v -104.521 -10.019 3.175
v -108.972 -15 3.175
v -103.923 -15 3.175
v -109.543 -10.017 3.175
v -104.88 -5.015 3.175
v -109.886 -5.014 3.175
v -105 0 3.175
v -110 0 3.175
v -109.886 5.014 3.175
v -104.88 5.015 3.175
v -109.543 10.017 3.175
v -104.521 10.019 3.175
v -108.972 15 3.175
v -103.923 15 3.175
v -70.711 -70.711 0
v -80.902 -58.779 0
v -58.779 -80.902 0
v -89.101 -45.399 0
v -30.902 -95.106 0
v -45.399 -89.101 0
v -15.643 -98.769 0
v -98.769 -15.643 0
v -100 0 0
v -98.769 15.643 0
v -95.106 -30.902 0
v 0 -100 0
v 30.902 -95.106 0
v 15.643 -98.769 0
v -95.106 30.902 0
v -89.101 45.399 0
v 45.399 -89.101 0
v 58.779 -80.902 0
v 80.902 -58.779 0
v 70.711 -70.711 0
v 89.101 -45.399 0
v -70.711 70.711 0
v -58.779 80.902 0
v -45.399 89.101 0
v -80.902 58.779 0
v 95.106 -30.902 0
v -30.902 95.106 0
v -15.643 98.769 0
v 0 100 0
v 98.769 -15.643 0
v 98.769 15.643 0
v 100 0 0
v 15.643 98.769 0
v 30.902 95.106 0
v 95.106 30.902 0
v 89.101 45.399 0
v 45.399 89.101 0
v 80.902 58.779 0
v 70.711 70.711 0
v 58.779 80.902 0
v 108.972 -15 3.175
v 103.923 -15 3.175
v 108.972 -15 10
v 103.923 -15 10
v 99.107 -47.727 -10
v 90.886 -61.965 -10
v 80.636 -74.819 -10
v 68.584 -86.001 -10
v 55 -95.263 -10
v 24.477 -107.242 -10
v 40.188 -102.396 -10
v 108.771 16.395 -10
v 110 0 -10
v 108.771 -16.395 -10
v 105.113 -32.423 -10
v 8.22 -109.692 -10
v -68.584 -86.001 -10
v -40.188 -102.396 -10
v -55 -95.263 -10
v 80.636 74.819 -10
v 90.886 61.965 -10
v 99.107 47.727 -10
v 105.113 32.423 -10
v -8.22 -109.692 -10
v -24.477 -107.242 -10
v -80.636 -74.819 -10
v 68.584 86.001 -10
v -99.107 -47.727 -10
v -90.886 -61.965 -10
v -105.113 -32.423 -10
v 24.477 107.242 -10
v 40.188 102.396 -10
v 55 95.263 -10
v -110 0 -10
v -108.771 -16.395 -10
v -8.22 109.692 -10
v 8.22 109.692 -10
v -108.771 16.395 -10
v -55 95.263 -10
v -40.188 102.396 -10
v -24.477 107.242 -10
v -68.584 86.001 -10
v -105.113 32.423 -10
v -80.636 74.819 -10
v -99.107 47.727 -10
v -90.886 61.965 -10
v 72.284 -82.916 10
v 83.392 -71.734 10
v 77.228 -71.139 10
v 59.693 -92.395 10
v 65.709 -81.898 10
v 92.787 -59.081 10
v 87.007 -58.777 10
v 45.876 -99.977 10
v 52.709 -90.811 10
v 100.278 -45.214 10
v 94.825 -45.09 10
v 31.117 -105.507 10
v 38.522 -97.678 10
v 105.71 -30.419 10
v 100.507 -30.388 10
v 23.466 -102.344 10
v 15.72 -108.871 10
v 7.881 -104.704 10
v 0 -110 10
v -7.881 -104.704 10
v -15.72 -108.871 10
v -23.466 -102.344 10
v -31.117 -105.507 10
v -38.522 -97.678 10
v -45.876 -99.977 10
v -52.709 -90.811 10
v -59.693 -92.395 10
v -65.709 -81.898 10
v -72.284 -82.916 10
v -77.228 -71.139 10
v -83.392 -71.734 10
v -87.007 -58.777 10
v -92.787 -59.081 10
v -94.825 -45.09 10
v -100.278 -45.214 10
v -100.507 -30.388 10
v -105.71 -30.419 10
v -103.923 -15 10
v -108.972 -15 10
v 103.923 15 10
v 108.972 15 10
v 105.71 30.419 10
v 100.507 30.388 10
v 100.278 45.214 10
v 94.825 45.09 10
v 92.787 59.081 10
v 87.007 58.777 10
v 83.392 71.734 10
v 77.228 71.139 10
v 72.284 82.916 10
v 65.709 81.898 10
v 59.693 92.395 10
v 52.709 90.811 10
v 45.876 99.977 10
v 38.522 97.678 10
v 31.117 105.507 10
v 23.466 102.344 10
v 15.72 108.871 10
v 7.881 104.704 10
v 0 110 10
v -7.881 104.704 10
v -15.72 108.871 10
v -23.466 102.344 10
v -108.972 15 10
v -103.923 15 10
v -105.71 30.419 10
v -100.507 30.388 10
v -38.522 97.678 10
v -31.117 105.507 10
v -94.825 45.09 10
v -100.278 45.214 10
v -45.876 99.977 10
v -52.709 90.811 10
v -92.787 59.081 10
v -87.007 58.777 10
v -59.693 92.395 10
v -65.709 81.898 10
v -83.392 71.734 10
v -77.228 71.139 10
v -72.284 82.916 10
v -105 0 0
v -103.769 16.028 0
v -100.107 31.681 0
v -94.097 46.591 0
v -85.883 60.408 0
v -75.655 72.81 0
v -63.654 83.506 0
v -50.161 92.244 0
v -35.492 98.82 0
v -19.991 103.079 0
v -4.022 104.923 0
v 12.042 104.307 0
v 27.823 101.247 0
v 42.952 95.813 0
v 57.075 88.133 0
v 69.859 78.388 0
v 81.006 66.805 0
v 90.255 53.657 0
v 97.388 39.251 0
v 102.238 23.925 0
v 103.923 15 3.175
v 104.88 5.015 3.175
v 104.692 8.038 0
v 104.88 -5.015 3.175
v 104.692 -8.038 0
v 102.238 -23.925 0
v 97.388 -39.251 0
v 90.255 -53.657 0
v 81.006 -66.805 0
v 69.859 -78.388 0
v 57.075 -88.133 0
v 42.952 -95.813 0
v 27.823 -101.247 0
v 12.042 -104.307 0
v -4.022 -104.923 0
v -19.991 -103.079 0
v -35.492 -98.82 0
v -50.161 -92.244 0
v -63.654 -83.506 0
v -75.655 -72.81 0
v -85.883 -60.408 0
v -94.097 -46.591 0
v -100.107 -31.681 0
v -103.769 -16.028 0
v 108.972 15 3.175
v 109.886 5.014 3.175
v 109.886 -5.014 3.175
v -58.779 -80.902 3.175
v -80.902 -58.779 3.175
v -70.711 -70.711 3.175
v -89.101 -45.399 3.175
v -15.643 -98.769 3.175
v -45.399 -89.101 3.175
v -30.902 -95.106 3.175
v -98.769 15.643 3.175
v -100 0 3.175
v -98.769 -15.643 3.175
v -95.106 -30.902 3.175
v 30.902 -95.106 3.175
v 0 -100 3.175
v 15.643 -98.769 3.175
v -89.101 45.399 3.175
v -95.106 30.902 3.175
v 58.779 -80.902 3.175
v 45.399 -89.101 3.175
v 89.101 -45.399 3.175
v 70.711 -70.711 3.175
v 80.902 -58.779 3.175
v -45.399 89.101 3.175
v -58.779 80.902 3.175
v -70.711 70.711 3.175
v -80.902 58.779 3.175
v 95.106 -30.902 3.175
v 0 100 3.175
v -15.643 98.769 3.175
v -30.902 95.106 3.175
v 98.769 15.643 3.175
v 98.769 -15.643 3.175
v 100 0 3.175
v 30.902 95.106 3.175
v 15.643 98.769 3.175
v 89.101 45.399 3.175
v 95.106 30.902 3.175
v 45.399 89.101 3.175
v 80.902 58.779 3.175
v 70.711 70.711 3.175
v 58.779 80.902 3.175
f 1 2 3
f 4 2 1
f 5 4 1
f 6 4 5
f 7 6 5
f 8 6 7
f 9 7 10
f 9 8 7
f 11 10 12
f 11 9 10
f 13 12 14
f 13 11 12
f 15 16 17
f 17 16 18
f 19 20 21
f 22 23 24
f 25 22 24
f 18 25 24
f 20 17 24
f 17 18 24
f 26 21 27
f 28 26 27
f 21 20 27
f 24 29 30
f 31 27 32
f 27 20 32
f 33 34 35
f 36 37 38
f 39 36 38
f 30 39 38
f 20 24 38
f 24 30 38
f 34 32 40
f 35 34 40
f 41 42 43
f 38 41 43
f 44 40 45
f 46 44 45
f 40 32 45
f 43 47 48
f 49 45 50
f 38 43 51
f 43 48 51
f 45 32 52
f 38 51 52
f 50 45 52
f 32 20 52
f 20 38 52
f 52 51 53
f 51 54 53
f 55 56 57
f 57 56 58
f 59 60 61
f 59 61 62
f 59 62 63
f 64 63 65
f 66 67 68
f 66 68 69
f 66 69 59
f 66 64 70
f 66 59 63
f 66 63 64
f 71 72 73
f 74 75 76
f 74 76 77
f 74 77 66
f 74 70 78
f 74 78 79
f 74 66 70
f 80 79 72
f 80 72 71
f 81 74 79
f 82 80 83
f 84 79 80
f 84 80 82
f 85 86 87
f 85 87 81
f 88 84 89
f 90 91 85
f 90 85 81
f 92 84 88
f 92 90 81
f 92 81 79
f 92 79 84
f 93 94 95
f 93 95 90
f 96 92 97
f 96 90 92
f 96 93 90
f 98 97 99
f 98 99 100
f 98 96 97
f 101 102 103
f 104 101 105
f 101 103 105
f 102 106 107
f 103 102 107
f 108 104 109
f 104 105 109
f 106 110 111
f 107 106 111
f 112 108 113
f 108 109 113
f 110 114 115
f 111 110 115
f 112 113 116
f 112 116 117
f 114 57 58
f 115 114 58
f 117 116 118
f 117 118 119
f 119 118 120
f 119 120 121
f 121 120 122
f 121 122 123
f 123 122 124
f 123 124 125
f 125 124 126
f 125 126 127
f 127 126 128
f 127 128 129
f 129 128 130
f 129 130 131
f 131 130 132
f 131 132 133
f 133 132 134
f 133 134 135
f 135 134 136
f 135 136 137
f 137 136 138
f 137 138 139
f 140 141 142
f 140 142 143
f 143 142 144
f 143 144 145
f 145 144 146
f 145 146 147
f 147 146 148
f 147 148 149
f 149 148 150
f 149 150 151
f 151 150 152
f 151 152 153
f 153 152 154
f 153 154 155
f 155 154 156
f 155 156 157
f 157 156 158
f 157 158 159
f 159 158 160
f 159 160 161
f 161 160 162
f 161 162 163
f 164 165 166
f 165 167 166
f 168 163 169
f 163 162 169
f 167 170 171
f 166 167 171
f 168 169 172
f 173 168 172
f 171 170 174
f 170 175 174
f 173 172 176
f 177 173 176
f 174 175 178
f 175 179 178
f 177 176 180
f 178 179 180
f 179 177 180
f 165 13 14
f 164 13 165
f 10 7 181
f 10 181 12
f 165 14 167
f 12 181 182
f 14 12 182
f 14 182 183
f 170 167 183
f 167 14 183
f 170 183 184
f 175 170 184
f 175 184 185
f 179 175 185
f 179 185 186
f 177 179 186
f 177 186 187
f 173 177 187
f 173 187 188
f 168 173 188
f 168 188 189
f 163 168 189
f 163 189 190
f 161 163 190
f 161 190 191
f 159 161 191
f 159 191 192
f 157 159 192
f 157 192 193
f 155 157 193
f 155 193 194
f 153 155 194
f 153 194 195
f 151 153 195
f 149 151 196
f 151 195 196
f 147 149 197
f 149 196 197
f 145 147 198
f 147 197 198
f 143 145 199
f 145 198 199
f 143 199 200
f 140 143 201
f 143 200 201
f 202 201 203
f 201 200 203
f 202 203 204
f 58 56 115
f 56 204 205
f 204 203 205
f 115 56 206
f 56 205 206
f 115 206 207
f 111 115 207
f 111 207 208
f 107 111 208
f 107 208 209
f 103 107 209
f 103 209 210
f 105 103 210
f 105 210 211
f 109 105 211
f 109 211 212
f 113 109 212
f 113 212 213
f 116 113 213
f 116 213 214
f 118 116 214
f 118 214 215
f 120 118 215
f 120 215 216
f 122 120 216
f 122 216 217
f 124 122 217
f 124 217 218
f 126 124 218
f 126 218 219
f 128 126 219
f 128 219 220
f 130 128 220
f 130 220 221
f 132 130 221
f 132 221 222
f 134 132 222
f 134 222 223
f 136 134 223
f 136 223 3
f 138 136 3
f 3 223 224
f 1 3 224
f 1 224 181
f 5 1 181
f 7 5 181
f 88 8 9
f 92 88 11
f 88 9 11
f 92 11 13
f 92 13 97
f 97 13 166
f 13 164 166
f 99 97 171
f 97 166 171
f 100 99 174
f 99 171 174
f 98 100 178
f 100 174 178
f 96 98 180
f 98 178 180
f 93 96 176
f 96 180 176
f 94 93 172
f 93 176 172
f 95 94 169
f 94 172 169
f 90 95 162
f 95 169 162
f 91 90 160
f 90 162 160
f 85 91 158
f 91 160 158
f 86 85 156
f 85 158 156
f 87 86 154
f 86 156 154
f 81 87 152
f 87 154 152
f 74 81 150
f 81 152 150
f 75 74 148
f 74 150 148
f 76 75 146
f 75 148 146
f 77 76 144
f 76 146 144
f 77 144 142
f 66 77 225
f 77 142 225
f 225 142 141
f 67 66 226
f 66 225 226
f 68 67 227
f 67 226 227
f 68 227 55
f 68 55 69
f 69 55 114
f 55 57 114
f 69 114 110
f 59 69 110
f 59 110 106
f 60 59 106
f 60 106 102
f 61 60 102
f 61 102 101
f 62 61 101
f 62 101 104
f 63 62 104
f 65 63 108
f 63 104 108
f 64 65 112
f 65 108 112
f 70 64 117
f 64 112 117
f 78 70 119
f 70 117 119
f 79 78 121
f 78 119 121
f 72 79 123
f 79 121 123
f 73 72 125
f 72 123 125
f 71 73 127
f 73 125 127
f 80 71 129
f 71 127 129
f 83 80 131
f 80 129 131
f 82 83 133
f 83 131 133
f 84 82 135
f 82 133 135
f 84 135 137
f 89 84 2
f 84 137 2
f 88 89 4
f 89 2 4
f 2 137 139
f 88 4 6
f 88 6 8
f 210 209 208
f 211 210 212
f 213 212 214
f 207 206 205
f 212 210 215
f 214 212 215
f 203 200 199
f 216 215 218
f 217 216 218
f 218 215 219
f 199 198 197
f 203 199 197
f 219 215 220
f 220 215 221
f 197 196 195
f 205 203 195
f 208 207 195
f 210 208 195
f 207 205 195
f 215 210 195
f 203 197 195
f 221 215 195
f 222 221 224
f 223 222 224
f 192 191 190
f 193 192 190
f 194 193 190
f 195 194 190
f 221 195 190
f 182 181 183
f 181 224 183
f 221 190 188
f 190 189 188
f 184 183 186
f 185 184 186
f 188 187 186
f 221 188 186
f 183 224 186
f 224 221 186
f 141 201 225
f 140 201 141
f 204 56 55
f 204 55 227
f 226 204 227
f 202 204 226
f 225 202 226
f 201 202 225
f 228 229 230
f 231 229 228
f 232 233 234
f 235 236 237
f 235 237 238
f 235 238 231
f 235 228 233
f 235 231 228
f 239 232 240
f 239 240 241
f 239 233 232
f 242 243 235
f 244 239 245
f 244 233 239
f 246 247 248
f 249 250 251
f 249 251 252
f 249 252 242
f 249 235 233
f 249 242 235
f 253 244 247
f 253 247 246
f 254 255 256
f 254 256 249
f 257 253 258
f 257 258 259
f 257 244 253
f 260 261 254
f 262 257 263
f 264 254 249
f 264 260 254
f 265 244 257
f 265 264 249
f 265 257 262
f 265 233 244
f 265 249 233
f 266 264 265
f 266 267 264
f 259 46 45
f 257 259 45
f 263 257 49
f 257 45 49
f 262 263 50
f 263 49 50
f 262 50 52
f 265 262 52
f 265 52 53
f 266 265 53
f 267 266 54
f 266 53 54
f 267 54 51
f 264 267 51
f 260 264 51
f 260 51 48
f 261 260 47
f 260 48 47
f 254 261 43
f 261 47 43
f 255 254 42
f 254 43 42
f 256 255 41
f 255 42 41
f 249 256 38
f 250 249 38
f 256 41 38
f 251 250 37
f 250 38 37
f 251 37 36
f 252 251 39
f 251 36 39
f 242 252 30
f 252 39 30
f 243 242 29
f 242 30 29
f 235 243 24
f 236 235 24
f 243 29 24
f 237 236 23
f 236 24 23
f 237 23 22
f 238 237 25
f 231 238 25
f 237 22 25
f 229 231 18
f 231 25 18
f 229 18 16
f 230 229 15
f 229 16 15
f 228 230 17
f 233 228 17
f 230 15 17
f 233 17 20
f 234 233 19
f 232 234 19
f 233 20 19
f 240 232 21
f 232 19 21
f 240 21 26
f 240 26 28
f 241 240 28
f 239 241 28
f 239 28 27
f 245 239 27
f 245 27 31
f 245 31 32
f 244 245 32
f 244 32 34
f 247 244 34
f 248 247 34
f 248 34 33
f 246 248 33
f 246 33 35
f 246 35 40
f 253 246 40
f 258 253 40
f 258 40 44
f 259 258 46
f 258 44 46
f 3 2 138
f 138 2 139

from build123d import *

# Parameters (mm, degrees)
SKETCH2_R               = 100
BASE_PLATE_DEPTH        = 3.175
SKETCH3_R               = 110
SKETCH3_R_2             = 105
BOSS_EXTRUDE2_DEPTH     = 10
SKETCH10_R              = 110
BOSS_EXTRUDE4_DEPTH     = 10
CUT_EXTRUDE2_DEPTH      = 156.884572681
CUT_EXTRUDE2_DEPTH_BACK = 156.884572681
SKETCH12_W              = 30
SKETCH12_H              = 6.825


with BuildPart() as part:
    # Sketch2 → Base Plate (new body)
    with BuildSketch(Plane(origin=(0, 0, 0), x_dir=(0, 1, 0), z_dir=(0, 0, 1))):
        with Locations(Location((0, 0, 0), (0, 0, 270))):
            Circle(SKETCH2_R)
    extrude(amount=BASE_PLATE_DEPTH)


with BuildPart() as body_2:
    # Sketch3 → Boss-Extrude2 (new body)
    with BuildSketch(Plane(origin=(0, 0, 0), x_dir=(1, 0, 0), z_dir=(0, 0, -1))):
        with Locations(Location((0, 0, 0), (0, 0, 180))):
            Circle(SKETCH3_R)
        with Locations(Location((0, 0, 0), (0, 0, 180))):
            Circle(SKETCH3_R_2, mode=Mode.SUBTRACT)
    extrude(amount=-BOSS_EXTRUDE2_DEPTH)

    # Sketch10 → Boss-Extrude4 (add)
    with BuildSketch(Plane(origin=(0, 0, 0), x_dir=(1, 0, 0), z_dir=(0, 0, -1))):
        with Locations(Location((0, 0, 0), (0, 0, 180))):
            Circle(SKETCH10_R)
    extrude(amount=BOSS_EXTRUDE4_DEPTH)

    # Sketch12 → Cut-Extrude2 (cut, two sides: drawn at the far end of the back side and taken through both)
    with BuildSketch(Plane.YZ.offset(-CUT_EXTRUDE2_DEPTH_BACK)):
        with Locations((0, 6.5875)):
            Rectangle(SKETCH12_W, SKETCH12_H)
    extrude(amount=CUT_EXTRUDE2_DEPTH + CUT_EXTRUDE2_DEPTH_BACK, mode=Mode.SUBTRACT)


solid = Compound([part.part, body_2.part])
